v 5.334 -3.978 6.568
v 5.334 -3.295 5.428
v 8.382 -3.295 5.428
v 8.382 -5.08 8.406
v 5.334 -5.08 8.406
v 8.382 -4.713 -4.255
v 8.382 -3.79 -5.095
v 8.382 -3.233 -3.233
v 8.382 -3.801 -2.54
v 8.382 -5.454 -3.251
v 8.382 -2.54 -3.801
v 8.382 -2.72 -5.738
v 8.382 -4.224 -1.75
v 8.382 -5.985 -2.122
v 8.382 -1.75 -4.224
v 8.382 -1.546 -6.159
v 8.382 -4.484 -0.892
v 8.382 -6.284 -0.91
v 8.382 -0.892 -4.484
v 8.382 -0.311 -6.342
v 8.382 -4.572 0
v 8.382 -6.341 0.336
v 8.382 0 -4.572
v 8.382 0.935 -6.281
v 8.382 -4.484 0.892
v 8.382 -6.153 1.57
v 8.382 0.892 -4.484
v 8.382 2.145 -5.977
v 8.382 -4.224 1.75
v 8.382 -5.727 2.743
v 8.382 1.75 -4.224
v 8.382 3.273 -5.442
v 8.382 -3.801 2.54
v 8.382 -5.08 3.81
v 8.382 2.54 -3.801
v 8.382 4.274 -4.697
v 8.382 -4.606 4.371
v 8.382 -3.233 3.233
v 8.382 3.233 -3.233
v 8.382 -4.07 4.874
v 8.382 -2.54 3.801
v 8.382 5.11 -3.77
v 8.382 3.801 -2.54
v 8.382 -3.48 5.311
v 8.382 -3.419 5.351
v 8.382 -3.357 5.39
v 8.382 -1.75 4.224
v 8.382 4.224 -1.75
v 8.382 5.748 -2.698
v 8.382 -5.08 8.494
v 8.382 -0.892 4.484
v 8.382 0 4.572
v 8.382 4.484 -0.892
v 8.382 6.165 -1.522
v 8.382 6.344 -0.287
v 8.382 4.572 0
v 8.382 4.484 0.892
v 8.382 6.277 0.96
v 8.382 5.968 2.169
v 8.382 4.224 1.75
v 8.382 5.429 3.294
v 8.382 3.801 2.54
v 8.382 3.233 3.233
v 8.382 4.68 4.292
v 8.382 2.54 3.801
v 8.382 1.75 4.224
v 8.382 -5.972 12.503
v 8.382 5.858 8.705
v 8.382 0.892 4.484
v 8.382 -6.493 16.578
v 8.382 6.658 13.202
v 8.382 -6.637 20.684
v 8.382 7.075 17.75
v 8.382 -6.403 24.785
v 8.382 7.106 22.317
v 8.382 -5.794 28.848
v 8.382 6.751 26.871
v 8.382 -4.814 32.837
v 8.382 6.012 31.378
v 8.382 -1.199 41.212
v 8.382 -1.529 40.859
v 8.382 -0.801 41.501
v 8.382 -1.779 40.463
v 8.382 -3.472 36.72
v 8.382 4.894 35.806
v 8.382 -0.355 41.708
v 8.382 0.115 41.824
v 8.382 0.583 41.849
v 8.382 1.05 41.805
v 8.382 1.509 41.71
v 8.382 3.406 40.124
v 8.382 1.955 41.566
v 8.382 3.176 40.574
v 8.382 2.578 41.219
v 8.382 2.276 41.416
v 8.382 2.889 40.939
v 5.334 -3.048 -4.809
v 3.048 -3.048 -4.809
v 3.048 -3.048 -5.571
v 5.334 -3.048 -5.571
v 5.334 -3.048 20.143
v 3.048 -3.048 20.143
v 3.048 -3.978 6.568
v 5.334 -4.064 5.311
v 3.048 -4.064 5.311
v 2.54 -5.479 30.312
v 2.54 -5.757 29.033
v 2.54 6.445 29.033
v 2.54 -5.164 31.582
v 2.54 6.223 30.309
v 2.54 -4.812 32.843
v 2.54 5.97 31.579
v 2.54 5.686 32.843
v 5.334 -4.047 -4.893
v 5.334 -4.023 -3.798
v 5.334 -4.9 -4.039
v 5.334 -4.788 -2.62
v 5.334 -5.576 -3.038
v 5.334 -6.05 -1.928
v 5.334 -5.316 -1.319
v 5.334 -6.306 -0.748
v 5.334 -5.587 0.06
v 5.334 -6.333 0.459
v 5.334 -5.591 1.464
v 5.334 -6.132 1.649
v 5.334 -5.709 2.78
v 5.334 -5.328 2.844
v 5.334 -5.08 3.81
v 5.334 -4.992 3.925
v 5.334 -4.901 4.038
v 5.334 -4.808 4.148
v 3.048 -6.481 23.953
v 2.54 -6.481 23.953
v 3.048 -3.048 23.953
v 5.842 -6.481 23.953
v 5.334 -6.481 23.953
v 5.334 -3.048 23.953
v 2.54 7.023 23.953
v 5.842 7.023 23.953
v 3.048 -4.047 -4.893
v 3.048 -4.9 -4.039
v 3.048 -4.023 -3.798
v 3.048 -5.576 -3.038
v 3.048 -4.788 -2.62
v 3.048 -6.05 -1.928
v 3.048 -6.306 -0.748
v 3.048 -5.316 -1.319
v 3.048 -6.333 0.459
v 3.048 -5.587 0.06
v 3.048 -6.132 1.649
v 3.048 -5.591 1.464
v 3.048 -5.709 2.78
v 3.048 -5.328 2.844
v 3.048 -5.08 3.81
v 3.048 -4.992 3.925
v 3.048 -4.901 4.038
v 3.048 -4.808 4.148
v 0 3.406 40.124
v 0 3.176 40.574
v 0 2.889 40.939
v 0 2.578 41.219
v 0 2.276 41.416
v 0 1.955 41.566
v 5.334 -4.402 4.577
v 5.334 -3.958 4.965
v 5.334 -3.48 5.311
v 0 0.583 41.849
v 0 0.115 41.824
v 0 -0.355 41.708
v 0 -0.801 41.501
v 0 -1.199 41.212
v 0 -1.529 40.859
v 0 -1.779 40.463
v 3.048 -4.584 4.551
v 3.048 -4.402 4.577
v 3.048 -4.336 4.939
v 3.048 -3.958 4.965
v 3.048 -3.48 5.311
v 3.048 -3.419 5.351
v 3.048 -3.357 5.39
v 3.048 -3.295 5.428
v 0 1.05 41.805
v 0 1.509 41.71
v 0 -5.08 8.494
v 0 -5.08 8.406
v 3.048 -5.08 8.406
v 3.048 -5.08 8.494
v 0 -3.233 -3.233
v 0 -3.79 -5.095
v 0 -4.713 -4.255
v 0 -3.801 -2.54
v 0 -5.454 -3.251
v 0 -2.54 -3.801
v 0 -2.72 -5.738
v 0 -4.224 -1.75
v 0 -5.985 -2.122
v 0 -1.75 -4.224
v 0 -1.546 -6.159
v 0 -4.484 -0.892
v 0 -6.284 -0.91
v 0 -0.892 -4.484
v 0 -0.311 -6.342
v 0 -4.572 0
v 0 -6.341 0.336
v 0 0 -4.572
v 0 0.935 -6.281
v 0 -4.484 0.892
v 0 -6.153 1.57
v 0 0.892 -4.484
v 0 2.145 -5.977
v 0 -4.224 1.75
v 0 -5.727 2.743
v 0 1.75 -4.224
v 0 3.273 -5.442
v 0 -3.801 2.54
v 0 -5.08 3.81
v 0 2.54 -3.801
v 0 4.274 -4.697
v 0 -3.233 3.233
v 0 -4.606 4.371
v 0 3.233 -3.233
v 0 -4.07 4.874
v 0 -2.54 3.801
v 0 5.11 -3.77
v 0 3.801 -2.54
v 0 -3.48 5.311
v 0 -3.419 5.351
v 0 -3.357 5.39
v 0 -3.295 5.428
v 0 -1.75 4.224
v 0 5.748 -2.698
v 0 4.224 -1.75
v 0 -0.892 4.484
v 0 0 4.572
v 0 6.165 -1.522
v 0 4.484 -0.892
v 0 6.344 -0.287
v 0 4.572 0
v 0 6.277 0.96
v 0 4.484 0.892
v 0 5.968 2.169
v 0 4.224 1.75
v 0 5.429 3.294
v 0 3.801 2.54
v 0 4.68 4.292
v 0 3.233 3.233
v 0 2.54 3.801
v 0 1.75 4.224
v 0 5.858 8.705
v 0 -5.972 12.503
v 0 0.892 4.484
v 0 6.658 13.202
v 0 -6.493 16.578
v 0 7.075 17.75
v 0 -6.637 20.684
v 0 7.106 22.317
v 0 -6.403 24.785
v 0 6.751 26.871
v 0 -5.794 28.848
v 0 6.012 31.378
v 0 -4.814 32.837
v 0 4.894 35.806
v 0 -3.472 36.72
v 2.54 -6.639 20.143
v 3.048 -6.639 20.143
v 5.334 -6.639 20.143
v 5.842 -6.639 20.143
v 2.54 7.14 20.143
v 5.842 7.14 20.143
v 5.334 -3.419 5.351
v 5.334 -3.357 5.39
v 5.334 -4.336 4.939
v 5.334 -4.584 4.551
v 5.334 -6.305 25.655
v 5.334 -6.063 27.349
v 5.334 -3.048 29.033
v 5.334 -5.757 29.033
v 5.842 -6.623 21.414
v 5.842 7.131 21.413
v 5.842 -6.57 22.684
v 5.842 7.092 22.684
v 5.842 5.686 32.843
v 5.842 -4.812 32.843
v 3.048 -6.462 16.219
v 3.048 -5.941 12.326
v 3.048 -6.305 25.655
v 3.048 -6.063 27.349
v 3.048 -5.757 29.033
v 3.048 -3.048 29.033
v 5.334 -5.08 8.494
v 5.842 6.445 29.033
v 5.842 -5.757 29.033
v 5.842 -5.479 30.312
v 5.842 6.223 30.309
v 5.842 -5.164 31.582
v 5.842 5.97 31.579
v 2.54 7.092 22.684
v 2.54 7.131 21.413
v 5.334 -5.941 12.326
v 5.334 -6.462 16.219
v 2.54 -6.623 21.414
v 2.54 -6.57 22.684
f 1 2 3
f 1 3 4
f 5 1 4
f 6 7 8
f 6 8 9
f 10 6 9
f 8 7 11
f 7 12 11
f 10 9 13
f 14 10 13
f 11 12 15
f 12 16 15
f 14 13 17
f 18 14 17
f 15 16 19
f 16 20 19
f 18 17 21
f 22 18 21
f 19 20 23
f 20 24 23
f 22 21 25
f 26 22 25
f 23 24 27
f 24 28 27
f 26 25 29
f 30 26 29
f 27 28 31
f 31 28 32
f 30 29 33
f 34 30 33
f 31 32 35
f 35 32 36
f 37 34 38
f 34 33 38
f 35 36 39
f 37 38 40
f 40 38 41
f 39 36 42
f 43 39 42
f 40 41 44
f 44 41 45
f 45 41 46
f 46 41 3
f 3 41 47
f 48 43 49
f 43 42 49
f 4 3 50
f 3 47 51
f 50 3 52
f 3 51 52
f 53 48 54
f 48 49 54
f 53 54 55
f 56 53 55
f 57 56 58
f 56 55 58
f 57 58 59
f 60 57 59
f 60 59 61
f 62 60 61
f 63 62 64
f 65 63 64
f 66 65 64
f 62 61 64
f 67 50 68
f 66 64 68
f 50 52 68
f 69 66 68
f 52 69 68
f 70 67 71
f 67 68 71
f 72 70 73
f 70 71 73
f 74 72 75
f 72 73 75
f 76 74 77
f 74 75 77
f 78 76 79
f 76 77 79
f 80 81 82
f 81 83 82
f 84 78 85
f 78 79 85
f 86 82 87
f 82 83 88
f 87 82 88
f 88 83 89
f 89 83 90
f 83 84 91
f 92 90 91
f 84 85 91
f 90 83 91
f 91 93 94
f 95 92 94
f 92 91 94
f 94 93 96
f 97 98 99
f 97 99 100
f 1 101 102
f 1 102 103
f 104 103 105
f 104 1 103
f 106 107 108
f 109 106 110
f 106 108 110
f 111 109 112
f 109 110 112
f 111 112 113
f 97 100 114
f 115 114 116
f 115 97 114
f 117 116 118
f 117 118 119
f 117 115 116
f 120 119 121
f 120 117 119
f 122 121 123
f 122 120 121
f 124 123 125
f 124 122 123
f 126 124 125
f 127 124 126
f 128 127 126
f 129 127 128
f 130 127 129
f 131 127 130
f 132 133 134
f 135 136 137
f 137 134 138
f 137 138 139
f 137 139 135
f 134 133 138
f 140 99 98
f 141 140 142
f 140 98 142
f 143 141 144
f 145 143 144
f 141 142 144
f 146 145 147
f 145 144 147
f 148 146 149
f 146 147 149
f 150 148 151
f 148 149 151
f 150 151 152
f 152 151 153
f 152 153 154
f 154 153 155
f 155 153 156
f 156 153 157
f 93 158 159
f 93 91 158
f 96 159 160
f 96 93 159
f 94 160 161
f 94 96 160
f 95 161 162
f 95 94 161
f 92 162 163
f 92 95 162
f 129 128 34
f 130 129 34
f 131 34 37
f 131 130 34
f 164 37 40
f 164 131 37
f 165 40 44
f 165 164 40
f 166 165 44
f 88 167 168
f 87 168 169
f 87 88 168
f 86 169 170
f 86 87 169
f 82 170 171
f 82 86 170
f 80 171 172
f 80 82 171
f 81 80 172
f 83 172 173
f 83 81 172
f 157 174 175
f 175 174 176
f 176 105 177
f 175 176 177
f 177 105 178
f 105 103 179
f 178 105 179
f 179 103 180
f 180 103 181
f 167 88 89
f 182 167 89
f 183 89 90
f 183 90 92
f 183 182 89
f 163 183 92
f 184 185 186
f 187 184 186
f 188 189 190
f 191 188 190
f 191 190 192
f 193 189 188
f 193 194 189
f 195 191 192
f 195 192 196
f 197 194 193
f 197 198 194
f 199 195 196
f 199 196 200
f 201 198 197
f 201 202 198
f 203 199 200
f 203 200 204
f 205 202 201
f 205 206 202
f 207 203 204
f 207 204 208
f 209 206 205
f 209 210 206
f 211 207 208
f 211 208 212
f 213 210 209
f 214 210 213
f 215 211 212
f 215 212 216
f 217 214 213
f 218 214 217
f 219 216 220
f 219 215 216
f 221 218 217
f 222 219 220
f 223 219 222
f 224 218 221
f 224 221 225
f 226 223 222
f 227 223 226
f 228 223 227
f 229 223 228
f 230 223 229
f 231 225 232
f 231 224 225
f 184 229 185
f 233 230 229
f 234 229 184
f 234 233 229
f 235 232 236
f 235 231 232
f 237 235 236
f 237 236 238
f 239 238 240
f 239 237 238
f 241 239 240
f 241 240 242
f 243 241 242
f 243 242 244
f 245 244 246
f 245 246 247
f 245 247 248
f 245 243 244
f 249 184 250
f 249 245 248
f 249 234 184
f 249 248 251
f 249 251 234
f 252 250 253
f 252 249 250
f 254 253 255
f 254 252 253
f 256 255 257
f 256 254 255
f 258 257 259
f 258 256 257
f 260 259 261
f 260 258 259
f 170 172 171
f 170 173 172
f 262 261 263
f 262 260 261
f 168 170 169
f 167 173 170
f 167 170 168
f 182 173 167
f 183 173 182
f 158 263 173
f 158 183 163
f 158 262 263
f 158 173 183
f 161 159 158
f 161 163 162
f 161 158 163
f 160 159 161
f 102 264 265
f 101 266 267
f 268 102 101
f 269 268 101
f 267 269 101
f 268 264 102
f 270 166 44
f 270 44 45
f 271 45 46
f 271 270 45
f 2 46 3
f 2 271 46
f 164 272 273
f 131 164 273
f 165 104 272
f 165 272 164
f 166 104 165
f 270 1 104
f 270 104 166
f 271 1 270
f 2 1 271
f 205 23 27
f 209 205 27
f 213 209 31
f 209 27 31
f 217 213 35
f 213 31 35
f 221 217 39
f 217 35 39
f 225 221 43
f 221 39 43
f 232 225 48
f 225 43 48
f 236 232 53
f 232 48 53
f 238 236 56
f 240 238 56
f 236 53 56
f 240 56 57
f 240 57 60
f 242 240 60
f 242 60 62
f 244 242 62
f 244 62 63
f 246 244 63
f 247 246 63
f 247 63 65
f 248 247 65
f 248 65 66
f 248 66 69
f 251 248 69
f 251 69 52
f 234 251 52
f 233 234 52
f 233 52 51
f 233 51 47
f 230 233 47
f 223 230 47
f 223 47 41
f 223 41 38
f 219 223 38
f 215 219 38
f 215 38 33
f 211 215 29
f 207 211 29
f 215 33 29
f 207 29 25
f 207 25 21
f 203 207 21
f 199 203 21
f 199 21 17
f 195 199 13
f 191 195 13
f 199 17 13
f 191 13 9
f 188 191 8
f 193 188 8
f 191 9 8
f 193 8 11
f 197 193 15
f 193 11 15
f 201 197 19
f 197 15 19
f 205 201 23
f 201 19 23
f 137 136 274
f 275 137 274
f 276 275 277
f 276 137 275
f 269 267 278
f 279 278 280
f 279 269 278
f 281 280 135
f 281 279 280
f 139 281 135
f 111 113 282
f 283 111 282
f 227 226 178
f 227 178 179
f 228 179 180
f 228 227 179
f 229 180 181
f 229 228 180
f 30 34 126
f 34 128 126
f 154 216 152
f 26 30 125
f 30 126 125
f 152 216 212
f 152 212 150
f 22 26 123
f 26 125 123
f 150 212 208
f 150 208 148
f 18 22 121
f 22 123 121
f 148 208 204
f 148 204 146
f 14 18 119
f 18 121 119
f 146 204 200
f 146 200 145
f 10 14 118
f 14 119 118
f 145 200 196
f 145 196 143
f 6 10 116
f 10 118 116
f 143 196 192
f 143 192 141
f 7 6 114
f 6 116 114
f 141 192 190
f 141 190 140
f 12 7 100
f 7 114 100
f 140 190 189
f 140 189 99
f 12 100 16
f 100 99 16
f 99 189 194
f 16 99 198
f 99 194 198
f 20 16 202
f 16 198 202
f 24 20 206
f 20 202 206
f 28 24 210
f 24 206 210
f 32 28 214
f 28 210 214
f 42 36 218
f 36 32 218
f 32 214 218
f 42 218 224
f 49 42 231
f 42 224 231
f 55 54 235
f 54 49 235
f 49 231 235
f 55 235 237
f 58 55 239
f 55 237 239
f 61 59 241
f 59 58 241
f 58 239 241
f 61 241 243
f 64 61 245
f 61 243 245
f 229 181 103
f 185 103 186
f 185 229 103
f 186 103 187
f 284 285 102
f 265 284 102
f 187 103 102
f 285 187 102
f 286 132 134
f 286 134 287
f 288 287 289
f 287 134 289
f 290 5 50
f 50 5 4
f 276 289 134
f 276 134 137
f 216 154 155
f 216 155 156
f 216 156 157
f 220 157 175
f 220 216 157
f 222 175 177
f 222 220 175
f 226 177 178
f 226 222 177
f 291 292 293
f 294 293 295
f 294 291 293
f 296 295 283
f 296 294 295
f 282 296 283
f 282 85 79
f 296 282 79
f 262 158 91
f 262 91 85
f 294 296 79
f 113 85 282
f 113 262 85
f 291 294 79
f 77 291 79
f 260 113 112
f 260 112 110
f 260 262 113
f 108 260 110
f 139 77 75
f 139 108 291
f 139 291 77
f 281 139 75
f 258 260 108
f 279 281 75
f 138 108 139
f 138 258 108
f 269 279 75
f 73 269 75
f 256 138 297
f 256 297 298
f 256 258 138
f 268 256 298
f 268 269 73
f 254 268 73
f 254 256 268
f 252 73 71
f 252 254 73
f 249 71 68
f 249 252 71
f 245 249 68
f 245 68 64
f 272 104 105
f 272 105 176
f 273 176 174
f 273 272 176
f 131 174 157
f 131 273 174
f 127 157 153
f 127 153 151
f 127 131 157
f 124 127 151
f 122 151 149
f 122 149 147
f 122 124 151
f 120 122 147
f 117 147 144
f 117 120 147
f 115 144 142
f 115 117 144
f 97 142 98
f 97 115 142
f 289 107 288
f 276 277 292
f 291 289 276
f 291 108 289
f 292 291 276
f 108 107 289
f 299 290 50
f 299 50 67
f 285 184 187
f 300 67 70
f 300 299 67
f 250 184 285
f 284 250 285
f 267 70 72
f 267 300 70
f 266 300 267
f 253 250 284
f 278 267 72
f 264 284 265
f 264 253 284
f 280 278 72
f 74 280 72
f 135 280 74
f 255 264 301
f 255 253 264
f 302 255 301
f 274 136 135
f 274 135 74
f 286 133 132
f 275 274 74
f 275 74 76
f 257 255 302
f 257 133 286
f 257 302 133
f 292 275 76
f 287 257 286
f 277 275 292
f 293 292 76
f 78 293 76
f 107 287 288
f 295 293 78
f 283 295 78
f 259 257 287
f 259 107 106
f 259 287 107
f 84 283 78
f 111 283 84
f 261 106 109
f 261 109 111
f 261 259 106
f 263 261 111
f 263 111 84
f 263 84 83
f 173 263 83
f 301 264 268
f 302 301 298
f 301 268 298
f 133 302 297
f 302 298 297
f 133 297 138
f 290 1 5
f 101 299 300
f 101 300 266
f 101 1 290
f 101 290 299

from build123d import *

# Parameters (mm, degrees)
SKETCH1_R               = 6.35
BOSS_EXTRUDE1_DEPTH     = 8.382
SKETCH6_W               = 8.382
SKETCH6_H               = 10.16
BOSS_EXTRUDE2_DEPTH     = 31.75
CUT_EXTRUDE4_DEPTH      = 37.592
BOSS_EXTRUDE3_START     = -8.382
BOSS_EXTRUDE3_DEPTH     = 8.382
BOSS_EXTRUDE4_START     = -8.382
SKETCH11_R              = 6.35
BOSS_EXTRUDE4_DEPTH     = 8.382
FILLET1_R               = 2.54
CUT_EXTRUDE5_DEPTH      = 12.192
CUT_EXTRUDE6_DEPTH      = 2.54
CUT_EXTRUDE6_DEPTH_BACK = 45.396714307
SKETCH13_W              = 3.302
SKETCH13_H              = 3.81
CUT_EXTRUDE7_DEPTH      = 5.842
CUT_EXTRUDE7_DEPTH_BACK = 2.032
SKETCH14_W              = 2.286
SKETCH14_H              = 39.733795437
BOSS_EXTRUDE5_DEPTH     = 2.286
SKETCH19_R              = 4.572
CUT_EXTRUDE8_DEPTH      = 20.32
CHAMFER1_SIZE           = 2.54
CHAMFER1_SIZE_2         = 1.929900828


with BuildPart() as part:
    # Sketch1 → Boss-Extrude1 (new body)
    with BuildSketch(Plane(origin=(0, 0, 0), x_dir=(0, 0, -1), z_dir=(1, 0, 0))):
        Circle(SKETCH1_R)
    extrude(amount=BOSS_EXTRUDE1_DEPTH)

    # Sketch6 → Boss-Extrude2 (add)
    with BuildSketch(Plane.XY):
        with Locations((4.191, 0)):
            Rectangle(SKETCH6_W, SKETCH6_H)
    extrude(amount=BOSS_EXTRUDE2_DEPTH)

    # Sketch9 → Cut-Extrude4 (cut)
    with BuildSketch(Plane.ZY):
        with BuildLine():
            Line((31.75, 5.08), (11.408365483, 5.08))
            Line((11.408365483, 5.08), (3.81, 5.08))
            ThreePointArc((3.81, 5.08), (5.339430543, 3.232524289), (6.092803339, 0.955518862))
            Line((6.092803339, 0.955518862), (11.408365483, 0.955518862))
            Line((11.408365483, 0.955518862), (11.408365483, -5.08))
            Line((11.408365483, -5.08), (31.75, -5.08))
            Line((31.75, -5.08), (31.75, 5.08))
        make_face()
    extrude(amount=-CUT_EXTRUDE4_DEPTH, mode=Mode.SUBTRACT)

    # Sketch8 → Boss-Extrude3 (add)
    with BuildSketch(Plane(origin=(8.382, 0, 0), x_dir=(0, 0, -1), z_dir=(1, 0, 0)).offset(BOSS_EXTRUDE3_START)):
        with BuildLine():
            ThreePointArc((-4.292149369, 4.679738646), (-6.310240248, 0.709484333), (-5.22417178, -3.609782433))
            ThreePointArc((-5.22417178, -3.609782433), (-6.393298566, -4.253843839), (-7.59869899, -4.827152092))
            ThreePointArc((-7.59869899, -4.827152092), (-24.920173533, -6.389046133), (-41.525963587, -1.219836328))
            ThreePointArc((-41.525963587, -1.219836328), (-41.809620195, 1.017710808), (-40.915378479, 3.088317002))
            ThreePointArc((-40.915378479, 3.088317002), (-22.743048705, 7.089374731), (-4.292149369, 4.679738646))
        make_face()
    extrude(amount=BOSS_EXTRUDE3_DEPTH)

    # Sketch11 → Boss-Extrude4 (add)
    with BuildSketch(Plane(origin=(8.382, 0, 0), x_dir=(0, 0, -1), z_dir=(1, 0, 0)).offset(BOSS_EXTRUDE4_START)):
        Circle(SKETCH11_R)
    extrude(amount=BOSS_EXTRUDE4_DEPTH)

    # Fillet1
    fillet1_edges = [part.edges().sort_by_distance(p)[0] for p in [
        (4.191, -1.219836328, 41.525963587),
        (4.191, 3.088317002, 40.915378479),
    ]]
    fillet(fillet1_edges, radius=FILLET1_R)

    # Sketch12 → Cut-Extrude5 (cut)
    with BuildSketch(Plane.ZY):
        with BuildLine():
            Line((5.311349681, -3.480239153), (6.475883823, -5.08))
            Line((6.475883823, -5.08), (3.81, -5.08))
            ThreePointArc((3.81, -5.08), (4.630287647, -4.345450069), (5.311349681, -3.480239153))
        make_face()
    extrude(amount=-CUT_EXTRUDE5_DEPTH, mode=Mode.SUBTRACT)

    # Sketch13 → Cut-Extrude6 (cut, two sides: drawn at the far end of the back side and taken through both)
    with BuildSketch(Plane.XZ.offset(5.08).offset(-CUT_EXTRUDE6_DEPTH_BACK)):
        with Locations((4.191, 30.937666225)):
            Rectangle(SKETCH13_W, SKETCH13_H)
        with Locations((4.191, 22.047666225)):
            Rectangle(SKETCH13_W, SKETCH13_H)
    extrude(amount=CUT_EXTRUDE6_DEPTH + CUT_EXTRUDE6_DEPTH_BACK, mode=Mode.SUBTRACT)

    # Sketch14 → Cut-Extrude7 (cut, two sides: drawn at the far end of the back side and taken through both)
    with BuildSketch(Plane.XZ.offset(5.08).offset(-CUT_EXTRUDE7_DEPTH_BACK)):
        with Locations((4.191, 9.165768507)):
            Rectangle(SKETCH14_W, SKETCH14_H)
    extrude(amount=CUT_EXTRUDE7_DEPTH + CUT_EXTRUDE7_DEPTH_BACK, mode=Mode.SUBTRACT)

    # Sketch15 → Boss-Extrude5 (add)
    with BuildSketch(Plane.ZY.offset(-5.334)):
        with BuildLine():
            Line((20.142666225, -3.048), (5.311349681, -4.064))
            ThreePointArc((5.311349681, -4.064), (0.047585795, -5.585594771), (-4.808654899, -3.048))
            Line((-4.808654899, -3.048), (20.142666225, -3.048))
        make_face()
    extrude(amount=BOSS_EXTRUDE5_DEPTH)

    # Sketch19 → Cut-Extrude8 (cut)
    with BuildSketch(Plane(origin=(8.382, 0, 0), x_dir=(0, 0, -1), z_dir=(1, 0, 0))):
        Circle(SKETCH19_R)
    extrude(amount=-CUT_EXTRUDE8_DEPTH, mode=Mode.SUBTRACT)

    # Chamfer1
    # the kernel refuses this chamfer: 2.54, 1.929900828 mm, written as the material it takes off along each edge
    with BuildSketch(Plane(origin=(-6.584556216, -5.08, 6.475883823), x_dir=(0, 0.7995159790431987, -0.6006448195519506), z_dir=(1, 0, 0))) as chamfer1_piece_1_section:
        Polygon((CHAMFER1_SIZE * 0.999886403459, CHAMFER1_SIZE * 0.0150724974299), (-CHAMFER1_SIZE_2 * 0.600644819472, CHAMFER1_SIZE_2 * 0.799515978937), (0, 0), align=None)
    chamfer1_piece_1 = extrude(amount=9.632556216, mode=Mode.PRIVATE)
    chamfer1_piece_1 = chamfer1_piece_1 - Plane(origin=(1.524, 0, 0), x_dir=(0, -0.800000000000003, 0.5999999999999959), z_dir=(-1, 0, 0)) * Cylinder(6.35, 30, mode=Mode.PRIVATE)
    add(chamfer1_piece_1, mode=Mode.SUBTRACT)
    with BuildSketch(Plane(origin=(-6.584556216, -5.08, 6.475883823), x_dir=(0, 0.7995159790431987, -0.6006448195519506), z_dir=(1, 0, 0))) as chamfer1_piece_2_section:
        Polygon((CHAMFER1_SIZE * 0.999886403459, CHAMFER1_SIZE * 0.0150724974299), (-CHAMFER1_SIZE_2 * 0.600644819472, CHAMFER1_SIZE_2 * 0.799515978937), (0, 0), align=None)
    chamfer1_piece_2 = extrude(amount=16.217112431, mode=Mode.PRIVATE)
    chamfer1_piece_2 = chamfer1_piece_2 - Plane(origin=(6.858, 0, 0), x_dir=(0, -0.800000000000003, 0.5999999999999959), z_dir=(-1, 0, 0)) * Cylinder(6.35, 43, mode=Mode.PRIVATE)
    chamfer1_piece_2 = split(chamfer1_piece_2, bisect_by=Plane(origin=(5.334, -3.740270515, 5.829817166), z_dir=(1, 0, 0)), keep=Keep.TOP, mode=Mode.PRIVATE)
    add(chamfer1_piece_2, mode=Mode.SUBTRACT)
    with BuildSketch(Plane(origin=(-1.250556216, -5.08, 6.475883823), x_dir=(0, 0.7995159790431987, -0.6006448195519506), z_dir=(1, 0, 0))) as chamfer1_piece_3_section:
        Polygon((CHAMFER1_SIZE * 0.999886403459, CHAMFER1_SIZE * 0.0150724974299), (-CHAMFER1_SIZE_2 * 0.600644819472, CHAMFER1_SIZE_2 * 0.799515978937), (0, 0), align=None)
    chamfer1_piece_3 = extrude(amount=16.217112431, mode=Mode.PRIVATE)
    chamfer1_piece_3 = chamfer1_piece_3 - Plane(origin=(1.524, 0, 0), x_dir=(0, -0.800000000000003, 0.5999999999999959), z_dir=(-1, 0, 0)) * Cylinder(6.35, 43, mode=Mode.PRIVATE)
    chamfer1_piece_3 = split(chamfer1_piece_3, bisect_by=Plane(origin=(3.048, -3.740270515, 5.829817166), z_dir=(-1, 0, 0)), keep=Keep.TOP, mode=Mode.PRIVATE)
    add(chamfer1_piece_3, mode=Mode.SUBTRACT)
    with BuildSketch(Plane(origin=(5.334, -5.08, 6.475883823), x_dir=(0, 0.7995159790431987, -0.6006448195519506), z_dir=(1, 0, 0))) as chamfer1_piece_4_section:
        Polygon((CHAMFER1_SIZE * 0.999886403459, CHAMFER1_SIZE * 0.0150724974299), (-CHAMFER1_SIZE_2 * 0.600644819472, CHAMFER1_SIZE_2 * 0.799515978937), (0, 0), align=None)
    chamfer1_piece_4 = extrude(amount=9.632556216, mode=Mode.PRIVATE)
    chamfer1_piece_4 = chamfer1_piece_4 - Plane(origin=(6.858, 0, 0), x_dir=(0, -0.800000000000003, 0.5999999999999959), z_dir=(-1, 0, 0)) * Cylinder(6.35, 30, mode=Mode.PRIVATE)
    add(chamfer1_piece_4, mode=Mode.SUBTRACT)


solid = part.part
